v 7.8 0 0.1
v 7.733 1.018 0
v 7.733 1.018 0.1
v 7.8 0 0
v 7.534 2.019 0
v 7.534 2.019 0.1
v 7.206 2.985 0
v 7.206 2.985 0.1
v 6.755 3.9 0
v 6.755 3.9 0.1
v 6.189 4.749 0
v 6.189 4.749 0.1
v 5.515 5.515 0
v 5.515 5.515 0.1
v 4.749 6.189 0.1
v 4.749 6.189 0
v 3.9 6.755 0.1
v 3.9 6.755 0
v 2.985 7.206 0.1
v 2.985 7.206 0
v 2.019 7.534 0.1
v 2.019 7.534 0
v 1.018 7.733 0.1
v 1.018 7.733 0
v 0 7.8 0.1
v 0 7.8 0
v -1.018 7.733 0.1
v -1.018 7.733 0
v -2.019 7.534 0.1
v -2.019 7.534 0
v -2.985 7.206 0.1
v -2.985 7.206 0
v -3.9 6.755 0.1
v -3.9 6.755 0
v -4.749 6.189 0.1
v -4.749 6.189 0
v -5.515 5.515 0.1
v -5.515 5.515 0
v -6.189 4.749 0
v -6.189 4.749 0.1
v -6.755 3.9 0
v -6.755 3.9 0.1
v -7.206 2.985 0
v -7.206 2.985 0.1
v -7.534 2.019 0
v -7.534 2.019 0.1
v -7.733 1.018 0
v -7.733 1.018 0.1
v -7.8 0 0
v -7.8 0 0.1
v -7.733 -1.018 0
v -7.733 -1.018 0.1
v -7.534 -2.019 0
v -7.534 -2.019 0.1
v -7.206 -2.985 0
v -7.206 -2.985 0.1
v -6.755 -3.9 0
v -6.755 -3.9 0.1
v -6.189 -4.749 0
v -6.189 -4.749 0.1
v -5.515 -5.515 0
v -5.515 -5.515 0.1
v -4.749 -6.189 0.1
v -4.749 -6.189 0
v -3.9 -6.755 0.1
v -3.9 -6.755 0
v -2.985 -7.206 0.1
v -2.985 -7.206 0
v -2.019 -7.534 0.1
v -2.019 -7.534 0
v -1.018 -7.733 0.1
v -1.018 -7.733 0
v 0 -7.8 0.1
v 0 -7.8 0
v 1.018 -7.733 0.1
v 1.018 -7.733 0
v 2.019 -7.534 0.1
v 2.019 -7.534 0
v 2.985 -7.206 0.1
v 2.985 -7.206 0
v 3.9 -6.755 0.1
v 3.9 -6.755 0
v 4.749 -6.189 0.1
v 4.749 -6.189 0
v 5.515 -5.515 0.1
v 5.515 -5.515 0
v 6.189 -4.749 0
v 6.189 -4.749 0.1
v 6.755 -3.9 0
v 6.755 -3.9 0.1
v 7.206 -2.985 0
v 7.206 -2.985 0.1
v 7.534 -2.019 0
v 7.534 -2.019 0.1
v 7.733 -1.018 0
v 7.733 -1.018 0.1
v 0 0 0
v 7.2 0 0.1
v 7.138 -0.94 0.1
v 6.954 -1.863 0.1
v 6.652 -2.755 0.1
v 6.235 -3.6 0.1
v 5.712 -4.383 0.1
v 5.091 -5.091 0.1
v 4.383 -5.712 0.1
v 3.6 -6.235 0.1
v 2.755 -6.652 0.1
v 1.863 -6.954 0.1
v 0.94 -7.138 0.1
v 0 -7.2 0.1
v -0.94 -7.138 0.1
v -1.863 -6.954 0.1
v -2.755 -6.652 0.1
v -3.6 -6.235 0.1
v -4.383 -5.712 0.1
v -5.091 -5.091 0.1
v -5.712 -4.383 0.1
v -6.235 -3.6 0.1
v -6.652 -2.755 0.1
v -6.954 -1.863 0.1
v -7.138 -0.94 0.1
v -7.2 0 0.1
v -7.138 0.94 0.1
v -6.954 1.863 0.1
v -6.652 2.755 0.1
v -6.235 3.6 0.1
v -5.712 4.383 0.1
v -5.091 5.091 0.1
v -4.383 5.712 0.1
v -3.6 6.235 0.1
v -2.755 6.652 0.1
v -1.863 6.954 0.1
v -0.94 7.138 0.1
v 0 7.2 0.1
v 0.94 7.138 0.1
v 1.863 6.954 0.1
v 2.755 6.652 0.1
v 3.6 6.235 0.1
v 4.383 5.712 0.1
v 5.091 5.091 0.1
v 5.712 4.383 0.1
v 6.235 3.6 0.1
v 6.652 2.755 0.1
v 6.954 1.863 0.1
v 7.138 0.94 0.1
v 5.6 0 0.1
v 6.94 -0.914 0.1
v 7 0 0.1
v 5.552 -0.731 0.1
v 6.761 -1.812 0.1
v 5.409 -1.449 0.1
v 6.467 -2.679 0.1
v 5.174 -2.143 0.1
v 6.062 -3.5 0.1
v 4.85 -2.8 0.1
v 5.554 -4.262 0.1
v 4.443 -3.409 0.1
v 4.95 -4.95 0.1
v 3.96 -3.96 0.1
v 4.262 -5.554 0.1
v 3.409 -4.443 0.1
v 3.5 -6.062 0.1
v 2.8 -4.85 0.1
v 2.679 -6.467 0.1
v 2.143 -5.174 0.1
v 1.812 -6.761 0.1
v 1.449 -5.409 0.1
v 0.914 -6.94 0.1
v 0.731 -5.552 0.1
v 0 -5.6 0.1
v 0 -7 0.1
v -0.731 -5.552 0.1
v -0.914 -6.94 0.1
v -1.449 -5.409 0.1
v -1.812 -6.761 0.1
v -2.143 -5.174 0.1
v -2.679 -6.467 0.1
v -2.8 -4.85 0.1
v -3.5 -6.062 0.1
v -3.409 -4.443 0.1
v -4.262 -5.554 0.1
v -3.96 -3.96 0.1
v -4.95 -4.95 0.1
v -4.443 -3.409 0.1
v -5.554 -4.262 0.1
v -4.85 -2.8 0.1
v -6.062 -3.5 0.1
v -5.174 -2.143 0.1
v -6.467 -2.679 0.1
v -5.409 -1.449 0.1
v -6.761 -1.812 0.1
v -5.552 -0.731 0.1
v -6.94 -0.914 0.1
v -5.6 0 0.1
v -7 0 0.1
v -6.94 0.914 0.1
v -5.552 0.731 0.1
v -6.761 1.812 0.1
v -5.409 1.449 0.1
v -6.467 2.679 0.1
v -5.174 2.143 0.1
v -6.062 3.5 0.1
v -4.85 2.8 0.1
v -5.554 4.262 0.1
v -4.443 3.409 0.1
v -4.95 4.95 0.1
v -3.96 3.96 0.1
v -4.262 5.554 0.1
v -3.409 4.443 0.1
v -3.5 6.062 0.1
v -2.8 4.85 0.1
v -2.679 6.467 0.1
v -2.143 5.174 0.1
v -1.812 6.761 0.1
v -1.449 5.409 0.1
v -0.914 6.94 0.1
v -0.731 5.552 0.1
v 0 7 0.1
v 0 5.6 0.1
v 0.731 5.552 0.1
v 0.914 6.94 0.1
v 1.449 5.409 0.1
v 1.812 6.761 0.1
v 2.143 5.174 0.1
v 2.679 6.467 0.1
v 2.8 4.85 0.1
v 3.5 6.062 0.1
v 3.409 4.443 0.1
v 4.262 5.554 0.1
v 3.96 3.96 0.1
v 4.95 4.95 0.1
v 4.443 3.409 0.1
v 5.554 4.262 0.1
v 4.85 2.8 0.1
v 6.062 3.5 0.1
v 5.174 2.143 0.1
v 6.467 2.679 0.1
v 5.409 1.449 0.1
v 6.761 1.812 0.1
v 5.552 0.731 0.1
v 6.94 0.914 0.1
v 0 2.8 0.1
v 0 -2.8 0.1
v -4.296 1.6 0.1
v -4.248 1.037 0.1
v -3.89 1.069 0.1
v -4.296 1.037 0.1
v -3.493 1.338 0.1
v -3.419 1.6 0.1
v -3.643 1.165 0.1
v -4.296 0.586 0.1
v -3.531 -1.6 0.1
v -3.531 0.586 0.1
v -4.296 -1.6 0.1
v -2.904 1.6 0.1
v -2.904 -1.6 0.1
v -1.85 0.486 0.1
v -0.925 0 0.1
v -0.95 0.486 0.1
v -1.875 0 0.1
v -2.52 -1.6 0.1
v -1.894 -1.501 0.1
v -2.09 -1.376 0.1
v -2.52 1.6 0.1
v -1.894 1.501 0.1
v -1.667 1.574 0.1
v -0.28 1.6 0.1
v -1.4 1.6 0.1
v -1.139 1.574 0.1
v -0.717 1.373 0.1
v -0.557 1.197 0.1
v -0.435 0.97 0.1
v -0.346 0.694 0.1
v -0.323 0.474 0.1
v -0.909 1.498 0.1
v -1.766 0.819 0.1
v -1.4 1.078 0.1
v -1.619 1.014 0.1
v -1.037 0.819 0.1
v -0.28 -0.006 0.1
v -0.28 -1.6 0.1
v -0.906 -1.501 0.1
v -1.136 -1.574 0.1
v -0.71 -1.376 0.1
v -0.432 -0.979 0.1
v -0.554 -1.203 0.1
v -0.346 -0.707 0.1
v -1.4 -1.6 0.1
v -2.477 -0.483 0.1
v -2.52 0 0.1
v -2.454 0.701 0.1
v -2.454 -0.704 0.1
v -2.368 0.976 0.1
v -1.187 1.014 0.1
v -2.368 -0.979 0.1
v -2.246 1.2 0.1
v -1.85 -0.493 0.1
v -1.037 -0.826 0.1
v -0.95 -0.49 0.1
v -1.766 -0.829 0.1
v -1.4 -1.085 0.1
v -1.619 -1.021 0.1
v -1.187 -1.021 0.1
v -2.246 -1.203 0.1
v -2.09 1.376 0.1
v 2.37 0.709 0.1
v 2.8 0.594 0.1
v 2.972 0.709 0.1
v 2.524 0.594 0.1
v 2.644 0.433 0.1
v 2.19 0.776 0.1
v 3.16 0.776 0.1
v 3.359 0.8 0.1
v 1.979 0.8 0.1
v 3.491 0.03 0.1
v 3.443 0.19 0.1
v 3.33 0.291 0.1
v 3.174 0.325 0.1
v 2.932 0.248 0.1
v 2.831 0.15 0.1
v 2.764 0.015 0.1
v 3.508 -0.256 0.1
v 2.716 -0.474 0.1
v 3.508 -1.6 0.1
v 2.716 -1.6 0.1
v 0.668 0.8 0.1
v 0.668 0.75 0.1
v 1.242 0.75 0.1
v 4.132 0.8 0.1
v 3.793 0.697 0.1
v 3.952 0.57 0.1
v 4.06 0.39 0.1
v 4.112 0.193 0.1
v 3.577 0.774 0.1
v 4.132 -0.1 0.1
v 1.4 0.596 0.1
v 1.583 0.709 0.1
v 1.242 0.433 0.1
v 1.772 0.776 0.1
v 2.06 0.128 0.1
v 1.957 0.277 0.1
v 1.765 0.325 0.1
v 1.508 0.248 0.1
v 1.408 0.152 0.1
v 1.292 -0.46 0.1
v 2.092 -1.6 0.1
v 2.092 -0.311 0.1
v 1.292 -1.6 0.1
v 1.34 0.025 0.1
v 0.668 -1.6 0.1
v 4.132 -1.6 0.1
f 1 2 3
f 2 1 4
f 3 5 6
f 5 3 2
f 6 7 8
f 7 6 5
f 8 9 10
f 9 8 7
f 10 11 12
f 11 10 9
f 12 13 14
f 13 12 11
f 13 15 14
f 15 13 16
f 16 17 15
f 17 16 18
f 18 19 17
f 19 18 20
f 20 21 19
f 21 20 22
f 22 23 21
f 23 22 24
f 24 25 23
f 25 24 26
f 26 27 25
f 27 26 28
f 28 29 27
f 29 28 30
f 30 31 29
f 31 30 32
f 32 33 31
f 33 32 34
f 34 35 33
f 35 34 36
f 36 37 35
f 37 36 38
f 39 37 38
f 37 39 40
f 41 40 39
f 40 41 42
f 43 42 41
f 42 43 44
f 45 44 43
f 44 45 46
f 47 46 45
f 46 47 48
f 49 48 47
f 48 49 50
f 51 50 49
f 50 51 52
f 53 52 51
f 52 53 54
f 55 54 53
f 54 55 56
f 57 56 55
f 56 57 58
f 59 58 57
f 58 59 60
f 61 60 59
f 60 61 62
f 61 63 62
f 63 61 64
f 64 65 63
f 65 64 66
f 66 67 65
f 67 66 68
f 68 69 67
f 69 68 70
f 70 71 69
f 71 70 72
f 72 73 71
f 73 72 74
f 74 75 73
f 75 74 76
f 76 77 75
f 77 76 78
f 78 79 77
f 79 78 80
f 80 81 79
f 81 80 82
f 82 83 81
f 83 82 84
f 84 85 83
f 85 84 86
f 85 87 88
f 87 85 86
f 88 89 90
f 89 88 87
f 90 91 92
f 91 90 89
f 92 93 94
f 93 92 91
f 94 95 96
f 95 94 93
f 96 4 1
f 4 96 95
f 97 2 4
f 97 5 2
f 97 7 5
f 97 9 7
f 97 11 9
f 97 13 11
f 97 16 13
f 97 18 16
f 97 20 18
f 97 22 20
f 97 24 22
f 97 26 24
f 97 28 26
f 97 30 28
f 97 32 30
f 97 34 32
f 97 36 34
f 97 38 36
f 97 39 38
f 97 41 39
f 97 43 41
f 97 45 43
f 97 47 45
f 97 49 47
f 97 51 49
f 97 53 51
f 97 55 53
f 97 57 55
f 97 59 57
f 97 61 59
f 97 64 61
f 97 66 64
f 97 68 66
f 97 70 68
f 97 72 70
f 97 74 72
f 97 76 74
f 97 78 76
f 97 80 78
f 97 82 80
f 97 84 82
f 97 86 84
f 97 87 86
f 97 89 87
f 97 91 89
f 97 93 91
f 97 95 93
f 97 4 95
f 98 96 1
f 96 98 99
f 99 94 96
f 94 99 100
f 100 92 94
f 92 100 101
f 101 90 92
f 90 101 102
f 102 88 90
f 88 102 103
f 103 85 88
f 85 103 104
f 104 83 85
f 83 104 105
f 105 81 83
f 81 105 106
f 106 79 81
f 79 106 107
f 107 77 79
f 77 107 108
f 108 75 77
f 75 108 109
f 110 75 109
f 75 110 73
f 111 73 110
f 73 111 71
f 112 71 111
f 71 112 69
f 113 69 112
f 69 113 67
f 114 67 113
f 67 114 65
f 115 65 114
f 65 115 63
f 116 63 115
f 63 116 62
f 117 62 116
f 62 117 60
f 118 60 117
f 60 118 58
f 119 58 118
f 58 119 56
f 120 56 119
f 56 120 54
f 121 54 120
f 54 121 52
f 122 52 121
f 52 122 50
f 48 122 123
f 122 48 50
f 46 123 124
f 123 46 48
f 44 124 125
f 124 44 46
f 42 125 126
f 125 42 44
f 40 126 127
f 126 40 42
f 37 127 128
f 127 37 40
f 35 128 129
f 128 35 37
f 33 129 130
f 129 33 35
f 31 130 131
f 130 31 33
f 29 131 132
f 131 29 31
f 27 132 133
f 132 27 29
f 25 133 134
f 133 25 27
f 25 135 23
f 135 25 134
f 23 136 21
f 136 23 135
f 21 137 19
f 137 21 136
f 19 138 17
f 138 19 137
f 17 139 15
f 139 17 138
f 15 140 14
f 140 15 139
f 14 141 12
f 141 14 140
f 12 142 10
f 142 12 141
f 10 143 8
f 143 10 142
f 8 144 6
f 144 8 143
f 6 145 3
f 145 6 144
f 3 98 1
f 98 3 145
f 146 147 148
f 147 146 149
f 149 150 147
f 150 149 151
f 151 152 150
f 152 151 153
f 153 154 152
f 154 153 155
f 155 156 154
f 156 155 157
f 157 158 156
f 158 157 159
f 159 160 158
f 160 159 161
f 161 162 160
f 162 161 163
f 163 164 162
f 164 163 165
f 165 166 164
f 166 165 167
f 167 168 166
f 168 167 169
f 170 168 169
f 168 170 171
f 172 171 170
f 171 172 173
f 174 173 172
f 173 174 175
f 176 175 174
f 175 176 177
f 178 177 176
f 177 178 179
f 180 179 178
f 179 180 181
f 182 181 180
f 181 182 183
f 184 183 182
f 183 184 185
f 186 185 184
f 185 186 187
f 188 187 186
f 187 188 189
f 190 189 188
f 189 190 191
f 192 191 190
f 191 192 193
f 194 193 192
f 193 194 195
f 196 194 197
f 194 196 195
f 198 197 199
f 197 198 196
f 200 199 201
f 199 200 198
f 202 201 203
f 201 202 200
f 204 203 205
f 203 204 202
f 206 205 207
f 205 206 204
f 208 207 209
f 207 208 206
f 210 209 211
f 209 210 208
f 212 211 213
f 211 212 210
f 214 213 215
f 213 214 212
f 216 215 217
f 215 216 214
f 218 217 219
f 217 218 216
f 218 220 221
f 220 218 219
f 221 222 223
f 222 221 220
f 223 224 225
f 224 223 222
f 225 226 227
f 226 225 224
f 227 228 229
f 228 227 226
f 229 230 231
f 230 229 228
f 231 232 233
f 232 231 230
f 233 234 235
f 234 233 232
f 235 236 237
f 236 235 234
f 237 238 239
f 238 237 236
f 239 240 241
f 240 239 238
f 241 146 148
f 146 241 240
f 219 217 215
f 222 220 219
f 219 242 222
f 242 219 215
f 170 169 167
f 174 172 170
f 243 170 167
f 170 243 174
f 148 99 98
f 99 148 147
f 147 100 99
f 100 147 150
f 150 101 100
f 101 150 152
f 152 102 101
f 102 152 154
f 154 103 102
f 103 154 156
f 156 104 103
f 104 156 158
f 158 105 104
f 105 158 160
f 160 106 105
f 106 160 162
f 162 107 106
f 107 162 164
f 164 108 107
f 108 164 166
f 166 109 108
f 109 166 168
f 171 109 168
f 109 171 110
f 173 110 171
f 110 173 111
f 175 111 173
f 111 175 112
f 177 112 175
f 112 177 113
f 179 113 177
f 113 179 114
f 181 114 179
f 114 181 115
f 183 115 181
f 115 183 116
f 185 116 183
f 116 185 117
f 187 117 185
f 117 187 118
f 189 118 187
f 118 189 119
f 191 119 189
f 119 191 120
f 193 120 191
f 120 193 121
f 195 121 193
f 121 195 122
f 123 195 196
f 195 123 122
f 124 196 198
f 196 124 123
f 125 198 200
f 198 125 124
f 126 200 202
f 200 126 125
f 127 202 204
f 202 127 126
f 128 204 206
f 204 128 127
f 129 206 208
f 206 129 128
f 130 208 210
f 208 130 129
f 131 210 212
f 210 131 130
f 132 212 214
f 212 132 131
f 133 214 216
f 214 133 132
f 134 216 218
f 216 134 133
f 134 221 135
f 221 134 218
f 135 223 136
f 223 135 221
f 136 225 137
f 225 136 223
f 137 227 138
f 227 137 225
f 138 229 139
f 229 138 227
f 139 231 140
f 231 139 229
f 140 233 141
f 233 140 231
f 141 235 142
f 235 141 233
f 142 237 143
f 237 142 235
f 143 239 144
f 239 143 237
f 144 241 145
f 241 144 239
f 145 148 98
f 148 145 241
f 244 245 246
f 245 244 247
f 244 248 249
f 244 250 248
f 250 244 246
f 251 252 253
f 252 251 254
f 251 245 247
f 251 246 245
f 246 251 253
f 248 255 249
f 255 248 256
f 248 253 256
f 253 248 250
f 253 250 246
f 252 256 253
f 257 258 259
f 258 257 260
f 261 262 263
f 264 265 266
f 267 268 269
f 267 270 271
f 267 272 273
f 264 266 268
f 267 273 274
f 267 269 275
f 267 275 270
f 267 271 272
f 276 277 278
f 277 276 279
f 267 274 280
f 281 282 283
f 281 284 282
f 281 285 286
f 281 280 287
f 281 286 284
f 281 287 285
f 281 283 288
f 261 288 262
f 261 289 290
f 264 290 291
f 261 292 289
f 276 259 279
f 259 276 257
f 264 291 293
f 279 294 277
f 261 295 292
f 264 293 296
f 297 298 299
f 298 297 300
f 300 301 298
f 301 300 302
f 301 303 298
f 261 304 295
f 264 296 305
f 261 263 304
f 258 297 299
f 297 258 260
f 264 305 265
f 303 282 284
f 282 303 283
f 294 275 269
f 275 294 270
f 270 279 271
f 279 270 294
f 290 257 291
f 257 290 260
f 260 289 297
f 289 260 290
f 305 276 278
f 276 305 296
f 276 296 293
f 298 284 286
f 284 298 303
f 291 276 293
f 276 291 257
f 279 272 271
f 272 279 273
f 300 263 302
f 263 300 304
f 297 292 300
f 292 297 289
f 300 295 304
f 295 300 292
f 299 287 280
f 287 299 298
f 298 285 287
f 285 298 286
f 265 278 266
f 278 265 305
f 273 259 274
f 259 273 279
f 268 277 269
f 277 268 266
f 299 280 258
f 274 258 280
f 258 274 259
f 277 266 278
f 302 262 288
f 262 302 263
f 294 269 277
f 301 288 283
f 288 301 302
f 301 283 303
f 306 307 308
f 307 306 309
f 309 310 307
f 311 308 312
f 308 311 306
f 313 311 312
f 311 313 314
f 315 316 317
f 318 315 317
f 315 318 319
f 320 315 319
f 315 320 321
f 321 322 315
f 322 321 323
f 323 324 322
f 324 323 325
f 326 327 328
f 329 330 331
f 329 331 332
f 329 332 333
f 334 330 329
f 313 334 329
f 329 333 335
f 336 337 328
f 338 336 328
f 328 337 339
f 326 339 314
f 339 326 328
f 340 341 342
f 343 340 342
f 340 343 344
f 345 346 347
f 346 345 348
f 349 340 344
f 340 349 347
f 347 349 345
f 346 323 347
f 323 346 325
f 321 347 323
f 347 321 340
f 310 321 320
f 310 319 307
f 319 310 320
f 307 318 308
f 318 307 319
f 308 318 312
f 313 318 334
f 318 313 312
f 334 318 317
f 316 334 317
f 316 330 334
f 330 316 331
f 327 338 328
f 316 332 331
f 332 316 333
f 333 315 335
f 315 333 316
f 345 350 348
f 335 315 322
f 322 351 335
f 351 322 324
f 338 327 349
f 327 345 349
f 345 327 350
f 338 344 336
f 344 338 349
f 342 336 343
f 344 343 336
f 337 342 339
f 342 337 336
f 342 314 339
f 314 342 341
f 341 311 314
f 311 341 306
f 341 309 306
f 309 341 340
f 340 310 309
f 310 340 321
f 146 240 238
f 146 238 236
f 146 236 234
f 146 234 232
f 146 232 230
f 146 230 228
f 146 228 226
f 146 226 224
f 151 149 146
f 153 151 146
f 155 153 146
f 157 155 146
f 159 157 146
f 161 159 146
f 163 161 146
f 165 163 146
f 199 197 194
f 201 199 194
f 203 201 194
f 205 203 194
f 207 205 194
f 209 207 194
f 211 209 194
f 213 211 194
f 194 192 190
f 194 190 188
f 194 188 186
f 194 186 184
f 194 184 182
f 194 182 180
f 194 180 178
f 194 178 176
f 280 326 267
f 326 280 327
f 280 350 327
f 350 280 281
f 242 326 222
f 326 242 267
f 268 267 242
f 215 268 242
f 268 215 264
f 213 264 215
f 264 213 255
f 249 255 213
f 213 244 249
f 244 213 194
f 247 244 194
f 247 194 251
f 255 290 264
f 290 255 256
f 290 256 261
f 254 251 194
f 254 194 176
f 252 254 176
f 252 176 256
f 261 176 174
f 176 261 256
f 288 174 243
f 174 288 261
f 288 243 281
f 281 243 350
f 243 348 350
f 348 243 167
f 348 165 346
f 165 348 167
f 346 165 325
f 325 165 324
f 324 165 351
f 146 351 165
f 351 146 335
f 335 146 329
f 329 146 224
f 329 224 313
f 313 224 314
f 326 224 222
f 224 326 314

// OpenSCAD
use <../lib.scad>
use <169675d.scad>
function ldraw_lib__820673k() = [
// 0 =Sticker  1.9 x  1.9 Round with "10 m" Height Restriction Sign
// 0 Name: 820673k.dat
// 0 Author: Takeshi Takahashi [RainbowDolphin]
// 0 !LDRAW_ORG Part Alias UPDATE 2023-04
// 0 !LICENSE Licensed under CC BY 4.0 : see CAreadme.txt
// 
// 0 BFC CERTIFY CCW
  [0,"BFC","CERTIFY"],
  [0,"BFC","CCW"],
// 
// 0 !KEYWORDS Crane, harbour, Set 6542
// 
// 0 !HISTORY 2023-08-25 [OrionP] Official Update 2023-04
// 
// 
// 0 // Alias of 169675d
// 1 16 0 0 0 1 0 0 0 1 0 0 0 1 169675d.dat
  [1,16,0,0,0,1,0,0,0,1,0,0,0,1, ldraw_lib__169675d()],
];
module ldraw_lib__820673k(step=0, col=false, unit=2/5, alt=false, line=0.2, solid=!$preview)
    makepoly(ldraw_lib__820673k(), step=step, col=col, unit=unit, alt=alt, line=line, solid=solid);
ldraw_lib__820673k(line=0.2);
